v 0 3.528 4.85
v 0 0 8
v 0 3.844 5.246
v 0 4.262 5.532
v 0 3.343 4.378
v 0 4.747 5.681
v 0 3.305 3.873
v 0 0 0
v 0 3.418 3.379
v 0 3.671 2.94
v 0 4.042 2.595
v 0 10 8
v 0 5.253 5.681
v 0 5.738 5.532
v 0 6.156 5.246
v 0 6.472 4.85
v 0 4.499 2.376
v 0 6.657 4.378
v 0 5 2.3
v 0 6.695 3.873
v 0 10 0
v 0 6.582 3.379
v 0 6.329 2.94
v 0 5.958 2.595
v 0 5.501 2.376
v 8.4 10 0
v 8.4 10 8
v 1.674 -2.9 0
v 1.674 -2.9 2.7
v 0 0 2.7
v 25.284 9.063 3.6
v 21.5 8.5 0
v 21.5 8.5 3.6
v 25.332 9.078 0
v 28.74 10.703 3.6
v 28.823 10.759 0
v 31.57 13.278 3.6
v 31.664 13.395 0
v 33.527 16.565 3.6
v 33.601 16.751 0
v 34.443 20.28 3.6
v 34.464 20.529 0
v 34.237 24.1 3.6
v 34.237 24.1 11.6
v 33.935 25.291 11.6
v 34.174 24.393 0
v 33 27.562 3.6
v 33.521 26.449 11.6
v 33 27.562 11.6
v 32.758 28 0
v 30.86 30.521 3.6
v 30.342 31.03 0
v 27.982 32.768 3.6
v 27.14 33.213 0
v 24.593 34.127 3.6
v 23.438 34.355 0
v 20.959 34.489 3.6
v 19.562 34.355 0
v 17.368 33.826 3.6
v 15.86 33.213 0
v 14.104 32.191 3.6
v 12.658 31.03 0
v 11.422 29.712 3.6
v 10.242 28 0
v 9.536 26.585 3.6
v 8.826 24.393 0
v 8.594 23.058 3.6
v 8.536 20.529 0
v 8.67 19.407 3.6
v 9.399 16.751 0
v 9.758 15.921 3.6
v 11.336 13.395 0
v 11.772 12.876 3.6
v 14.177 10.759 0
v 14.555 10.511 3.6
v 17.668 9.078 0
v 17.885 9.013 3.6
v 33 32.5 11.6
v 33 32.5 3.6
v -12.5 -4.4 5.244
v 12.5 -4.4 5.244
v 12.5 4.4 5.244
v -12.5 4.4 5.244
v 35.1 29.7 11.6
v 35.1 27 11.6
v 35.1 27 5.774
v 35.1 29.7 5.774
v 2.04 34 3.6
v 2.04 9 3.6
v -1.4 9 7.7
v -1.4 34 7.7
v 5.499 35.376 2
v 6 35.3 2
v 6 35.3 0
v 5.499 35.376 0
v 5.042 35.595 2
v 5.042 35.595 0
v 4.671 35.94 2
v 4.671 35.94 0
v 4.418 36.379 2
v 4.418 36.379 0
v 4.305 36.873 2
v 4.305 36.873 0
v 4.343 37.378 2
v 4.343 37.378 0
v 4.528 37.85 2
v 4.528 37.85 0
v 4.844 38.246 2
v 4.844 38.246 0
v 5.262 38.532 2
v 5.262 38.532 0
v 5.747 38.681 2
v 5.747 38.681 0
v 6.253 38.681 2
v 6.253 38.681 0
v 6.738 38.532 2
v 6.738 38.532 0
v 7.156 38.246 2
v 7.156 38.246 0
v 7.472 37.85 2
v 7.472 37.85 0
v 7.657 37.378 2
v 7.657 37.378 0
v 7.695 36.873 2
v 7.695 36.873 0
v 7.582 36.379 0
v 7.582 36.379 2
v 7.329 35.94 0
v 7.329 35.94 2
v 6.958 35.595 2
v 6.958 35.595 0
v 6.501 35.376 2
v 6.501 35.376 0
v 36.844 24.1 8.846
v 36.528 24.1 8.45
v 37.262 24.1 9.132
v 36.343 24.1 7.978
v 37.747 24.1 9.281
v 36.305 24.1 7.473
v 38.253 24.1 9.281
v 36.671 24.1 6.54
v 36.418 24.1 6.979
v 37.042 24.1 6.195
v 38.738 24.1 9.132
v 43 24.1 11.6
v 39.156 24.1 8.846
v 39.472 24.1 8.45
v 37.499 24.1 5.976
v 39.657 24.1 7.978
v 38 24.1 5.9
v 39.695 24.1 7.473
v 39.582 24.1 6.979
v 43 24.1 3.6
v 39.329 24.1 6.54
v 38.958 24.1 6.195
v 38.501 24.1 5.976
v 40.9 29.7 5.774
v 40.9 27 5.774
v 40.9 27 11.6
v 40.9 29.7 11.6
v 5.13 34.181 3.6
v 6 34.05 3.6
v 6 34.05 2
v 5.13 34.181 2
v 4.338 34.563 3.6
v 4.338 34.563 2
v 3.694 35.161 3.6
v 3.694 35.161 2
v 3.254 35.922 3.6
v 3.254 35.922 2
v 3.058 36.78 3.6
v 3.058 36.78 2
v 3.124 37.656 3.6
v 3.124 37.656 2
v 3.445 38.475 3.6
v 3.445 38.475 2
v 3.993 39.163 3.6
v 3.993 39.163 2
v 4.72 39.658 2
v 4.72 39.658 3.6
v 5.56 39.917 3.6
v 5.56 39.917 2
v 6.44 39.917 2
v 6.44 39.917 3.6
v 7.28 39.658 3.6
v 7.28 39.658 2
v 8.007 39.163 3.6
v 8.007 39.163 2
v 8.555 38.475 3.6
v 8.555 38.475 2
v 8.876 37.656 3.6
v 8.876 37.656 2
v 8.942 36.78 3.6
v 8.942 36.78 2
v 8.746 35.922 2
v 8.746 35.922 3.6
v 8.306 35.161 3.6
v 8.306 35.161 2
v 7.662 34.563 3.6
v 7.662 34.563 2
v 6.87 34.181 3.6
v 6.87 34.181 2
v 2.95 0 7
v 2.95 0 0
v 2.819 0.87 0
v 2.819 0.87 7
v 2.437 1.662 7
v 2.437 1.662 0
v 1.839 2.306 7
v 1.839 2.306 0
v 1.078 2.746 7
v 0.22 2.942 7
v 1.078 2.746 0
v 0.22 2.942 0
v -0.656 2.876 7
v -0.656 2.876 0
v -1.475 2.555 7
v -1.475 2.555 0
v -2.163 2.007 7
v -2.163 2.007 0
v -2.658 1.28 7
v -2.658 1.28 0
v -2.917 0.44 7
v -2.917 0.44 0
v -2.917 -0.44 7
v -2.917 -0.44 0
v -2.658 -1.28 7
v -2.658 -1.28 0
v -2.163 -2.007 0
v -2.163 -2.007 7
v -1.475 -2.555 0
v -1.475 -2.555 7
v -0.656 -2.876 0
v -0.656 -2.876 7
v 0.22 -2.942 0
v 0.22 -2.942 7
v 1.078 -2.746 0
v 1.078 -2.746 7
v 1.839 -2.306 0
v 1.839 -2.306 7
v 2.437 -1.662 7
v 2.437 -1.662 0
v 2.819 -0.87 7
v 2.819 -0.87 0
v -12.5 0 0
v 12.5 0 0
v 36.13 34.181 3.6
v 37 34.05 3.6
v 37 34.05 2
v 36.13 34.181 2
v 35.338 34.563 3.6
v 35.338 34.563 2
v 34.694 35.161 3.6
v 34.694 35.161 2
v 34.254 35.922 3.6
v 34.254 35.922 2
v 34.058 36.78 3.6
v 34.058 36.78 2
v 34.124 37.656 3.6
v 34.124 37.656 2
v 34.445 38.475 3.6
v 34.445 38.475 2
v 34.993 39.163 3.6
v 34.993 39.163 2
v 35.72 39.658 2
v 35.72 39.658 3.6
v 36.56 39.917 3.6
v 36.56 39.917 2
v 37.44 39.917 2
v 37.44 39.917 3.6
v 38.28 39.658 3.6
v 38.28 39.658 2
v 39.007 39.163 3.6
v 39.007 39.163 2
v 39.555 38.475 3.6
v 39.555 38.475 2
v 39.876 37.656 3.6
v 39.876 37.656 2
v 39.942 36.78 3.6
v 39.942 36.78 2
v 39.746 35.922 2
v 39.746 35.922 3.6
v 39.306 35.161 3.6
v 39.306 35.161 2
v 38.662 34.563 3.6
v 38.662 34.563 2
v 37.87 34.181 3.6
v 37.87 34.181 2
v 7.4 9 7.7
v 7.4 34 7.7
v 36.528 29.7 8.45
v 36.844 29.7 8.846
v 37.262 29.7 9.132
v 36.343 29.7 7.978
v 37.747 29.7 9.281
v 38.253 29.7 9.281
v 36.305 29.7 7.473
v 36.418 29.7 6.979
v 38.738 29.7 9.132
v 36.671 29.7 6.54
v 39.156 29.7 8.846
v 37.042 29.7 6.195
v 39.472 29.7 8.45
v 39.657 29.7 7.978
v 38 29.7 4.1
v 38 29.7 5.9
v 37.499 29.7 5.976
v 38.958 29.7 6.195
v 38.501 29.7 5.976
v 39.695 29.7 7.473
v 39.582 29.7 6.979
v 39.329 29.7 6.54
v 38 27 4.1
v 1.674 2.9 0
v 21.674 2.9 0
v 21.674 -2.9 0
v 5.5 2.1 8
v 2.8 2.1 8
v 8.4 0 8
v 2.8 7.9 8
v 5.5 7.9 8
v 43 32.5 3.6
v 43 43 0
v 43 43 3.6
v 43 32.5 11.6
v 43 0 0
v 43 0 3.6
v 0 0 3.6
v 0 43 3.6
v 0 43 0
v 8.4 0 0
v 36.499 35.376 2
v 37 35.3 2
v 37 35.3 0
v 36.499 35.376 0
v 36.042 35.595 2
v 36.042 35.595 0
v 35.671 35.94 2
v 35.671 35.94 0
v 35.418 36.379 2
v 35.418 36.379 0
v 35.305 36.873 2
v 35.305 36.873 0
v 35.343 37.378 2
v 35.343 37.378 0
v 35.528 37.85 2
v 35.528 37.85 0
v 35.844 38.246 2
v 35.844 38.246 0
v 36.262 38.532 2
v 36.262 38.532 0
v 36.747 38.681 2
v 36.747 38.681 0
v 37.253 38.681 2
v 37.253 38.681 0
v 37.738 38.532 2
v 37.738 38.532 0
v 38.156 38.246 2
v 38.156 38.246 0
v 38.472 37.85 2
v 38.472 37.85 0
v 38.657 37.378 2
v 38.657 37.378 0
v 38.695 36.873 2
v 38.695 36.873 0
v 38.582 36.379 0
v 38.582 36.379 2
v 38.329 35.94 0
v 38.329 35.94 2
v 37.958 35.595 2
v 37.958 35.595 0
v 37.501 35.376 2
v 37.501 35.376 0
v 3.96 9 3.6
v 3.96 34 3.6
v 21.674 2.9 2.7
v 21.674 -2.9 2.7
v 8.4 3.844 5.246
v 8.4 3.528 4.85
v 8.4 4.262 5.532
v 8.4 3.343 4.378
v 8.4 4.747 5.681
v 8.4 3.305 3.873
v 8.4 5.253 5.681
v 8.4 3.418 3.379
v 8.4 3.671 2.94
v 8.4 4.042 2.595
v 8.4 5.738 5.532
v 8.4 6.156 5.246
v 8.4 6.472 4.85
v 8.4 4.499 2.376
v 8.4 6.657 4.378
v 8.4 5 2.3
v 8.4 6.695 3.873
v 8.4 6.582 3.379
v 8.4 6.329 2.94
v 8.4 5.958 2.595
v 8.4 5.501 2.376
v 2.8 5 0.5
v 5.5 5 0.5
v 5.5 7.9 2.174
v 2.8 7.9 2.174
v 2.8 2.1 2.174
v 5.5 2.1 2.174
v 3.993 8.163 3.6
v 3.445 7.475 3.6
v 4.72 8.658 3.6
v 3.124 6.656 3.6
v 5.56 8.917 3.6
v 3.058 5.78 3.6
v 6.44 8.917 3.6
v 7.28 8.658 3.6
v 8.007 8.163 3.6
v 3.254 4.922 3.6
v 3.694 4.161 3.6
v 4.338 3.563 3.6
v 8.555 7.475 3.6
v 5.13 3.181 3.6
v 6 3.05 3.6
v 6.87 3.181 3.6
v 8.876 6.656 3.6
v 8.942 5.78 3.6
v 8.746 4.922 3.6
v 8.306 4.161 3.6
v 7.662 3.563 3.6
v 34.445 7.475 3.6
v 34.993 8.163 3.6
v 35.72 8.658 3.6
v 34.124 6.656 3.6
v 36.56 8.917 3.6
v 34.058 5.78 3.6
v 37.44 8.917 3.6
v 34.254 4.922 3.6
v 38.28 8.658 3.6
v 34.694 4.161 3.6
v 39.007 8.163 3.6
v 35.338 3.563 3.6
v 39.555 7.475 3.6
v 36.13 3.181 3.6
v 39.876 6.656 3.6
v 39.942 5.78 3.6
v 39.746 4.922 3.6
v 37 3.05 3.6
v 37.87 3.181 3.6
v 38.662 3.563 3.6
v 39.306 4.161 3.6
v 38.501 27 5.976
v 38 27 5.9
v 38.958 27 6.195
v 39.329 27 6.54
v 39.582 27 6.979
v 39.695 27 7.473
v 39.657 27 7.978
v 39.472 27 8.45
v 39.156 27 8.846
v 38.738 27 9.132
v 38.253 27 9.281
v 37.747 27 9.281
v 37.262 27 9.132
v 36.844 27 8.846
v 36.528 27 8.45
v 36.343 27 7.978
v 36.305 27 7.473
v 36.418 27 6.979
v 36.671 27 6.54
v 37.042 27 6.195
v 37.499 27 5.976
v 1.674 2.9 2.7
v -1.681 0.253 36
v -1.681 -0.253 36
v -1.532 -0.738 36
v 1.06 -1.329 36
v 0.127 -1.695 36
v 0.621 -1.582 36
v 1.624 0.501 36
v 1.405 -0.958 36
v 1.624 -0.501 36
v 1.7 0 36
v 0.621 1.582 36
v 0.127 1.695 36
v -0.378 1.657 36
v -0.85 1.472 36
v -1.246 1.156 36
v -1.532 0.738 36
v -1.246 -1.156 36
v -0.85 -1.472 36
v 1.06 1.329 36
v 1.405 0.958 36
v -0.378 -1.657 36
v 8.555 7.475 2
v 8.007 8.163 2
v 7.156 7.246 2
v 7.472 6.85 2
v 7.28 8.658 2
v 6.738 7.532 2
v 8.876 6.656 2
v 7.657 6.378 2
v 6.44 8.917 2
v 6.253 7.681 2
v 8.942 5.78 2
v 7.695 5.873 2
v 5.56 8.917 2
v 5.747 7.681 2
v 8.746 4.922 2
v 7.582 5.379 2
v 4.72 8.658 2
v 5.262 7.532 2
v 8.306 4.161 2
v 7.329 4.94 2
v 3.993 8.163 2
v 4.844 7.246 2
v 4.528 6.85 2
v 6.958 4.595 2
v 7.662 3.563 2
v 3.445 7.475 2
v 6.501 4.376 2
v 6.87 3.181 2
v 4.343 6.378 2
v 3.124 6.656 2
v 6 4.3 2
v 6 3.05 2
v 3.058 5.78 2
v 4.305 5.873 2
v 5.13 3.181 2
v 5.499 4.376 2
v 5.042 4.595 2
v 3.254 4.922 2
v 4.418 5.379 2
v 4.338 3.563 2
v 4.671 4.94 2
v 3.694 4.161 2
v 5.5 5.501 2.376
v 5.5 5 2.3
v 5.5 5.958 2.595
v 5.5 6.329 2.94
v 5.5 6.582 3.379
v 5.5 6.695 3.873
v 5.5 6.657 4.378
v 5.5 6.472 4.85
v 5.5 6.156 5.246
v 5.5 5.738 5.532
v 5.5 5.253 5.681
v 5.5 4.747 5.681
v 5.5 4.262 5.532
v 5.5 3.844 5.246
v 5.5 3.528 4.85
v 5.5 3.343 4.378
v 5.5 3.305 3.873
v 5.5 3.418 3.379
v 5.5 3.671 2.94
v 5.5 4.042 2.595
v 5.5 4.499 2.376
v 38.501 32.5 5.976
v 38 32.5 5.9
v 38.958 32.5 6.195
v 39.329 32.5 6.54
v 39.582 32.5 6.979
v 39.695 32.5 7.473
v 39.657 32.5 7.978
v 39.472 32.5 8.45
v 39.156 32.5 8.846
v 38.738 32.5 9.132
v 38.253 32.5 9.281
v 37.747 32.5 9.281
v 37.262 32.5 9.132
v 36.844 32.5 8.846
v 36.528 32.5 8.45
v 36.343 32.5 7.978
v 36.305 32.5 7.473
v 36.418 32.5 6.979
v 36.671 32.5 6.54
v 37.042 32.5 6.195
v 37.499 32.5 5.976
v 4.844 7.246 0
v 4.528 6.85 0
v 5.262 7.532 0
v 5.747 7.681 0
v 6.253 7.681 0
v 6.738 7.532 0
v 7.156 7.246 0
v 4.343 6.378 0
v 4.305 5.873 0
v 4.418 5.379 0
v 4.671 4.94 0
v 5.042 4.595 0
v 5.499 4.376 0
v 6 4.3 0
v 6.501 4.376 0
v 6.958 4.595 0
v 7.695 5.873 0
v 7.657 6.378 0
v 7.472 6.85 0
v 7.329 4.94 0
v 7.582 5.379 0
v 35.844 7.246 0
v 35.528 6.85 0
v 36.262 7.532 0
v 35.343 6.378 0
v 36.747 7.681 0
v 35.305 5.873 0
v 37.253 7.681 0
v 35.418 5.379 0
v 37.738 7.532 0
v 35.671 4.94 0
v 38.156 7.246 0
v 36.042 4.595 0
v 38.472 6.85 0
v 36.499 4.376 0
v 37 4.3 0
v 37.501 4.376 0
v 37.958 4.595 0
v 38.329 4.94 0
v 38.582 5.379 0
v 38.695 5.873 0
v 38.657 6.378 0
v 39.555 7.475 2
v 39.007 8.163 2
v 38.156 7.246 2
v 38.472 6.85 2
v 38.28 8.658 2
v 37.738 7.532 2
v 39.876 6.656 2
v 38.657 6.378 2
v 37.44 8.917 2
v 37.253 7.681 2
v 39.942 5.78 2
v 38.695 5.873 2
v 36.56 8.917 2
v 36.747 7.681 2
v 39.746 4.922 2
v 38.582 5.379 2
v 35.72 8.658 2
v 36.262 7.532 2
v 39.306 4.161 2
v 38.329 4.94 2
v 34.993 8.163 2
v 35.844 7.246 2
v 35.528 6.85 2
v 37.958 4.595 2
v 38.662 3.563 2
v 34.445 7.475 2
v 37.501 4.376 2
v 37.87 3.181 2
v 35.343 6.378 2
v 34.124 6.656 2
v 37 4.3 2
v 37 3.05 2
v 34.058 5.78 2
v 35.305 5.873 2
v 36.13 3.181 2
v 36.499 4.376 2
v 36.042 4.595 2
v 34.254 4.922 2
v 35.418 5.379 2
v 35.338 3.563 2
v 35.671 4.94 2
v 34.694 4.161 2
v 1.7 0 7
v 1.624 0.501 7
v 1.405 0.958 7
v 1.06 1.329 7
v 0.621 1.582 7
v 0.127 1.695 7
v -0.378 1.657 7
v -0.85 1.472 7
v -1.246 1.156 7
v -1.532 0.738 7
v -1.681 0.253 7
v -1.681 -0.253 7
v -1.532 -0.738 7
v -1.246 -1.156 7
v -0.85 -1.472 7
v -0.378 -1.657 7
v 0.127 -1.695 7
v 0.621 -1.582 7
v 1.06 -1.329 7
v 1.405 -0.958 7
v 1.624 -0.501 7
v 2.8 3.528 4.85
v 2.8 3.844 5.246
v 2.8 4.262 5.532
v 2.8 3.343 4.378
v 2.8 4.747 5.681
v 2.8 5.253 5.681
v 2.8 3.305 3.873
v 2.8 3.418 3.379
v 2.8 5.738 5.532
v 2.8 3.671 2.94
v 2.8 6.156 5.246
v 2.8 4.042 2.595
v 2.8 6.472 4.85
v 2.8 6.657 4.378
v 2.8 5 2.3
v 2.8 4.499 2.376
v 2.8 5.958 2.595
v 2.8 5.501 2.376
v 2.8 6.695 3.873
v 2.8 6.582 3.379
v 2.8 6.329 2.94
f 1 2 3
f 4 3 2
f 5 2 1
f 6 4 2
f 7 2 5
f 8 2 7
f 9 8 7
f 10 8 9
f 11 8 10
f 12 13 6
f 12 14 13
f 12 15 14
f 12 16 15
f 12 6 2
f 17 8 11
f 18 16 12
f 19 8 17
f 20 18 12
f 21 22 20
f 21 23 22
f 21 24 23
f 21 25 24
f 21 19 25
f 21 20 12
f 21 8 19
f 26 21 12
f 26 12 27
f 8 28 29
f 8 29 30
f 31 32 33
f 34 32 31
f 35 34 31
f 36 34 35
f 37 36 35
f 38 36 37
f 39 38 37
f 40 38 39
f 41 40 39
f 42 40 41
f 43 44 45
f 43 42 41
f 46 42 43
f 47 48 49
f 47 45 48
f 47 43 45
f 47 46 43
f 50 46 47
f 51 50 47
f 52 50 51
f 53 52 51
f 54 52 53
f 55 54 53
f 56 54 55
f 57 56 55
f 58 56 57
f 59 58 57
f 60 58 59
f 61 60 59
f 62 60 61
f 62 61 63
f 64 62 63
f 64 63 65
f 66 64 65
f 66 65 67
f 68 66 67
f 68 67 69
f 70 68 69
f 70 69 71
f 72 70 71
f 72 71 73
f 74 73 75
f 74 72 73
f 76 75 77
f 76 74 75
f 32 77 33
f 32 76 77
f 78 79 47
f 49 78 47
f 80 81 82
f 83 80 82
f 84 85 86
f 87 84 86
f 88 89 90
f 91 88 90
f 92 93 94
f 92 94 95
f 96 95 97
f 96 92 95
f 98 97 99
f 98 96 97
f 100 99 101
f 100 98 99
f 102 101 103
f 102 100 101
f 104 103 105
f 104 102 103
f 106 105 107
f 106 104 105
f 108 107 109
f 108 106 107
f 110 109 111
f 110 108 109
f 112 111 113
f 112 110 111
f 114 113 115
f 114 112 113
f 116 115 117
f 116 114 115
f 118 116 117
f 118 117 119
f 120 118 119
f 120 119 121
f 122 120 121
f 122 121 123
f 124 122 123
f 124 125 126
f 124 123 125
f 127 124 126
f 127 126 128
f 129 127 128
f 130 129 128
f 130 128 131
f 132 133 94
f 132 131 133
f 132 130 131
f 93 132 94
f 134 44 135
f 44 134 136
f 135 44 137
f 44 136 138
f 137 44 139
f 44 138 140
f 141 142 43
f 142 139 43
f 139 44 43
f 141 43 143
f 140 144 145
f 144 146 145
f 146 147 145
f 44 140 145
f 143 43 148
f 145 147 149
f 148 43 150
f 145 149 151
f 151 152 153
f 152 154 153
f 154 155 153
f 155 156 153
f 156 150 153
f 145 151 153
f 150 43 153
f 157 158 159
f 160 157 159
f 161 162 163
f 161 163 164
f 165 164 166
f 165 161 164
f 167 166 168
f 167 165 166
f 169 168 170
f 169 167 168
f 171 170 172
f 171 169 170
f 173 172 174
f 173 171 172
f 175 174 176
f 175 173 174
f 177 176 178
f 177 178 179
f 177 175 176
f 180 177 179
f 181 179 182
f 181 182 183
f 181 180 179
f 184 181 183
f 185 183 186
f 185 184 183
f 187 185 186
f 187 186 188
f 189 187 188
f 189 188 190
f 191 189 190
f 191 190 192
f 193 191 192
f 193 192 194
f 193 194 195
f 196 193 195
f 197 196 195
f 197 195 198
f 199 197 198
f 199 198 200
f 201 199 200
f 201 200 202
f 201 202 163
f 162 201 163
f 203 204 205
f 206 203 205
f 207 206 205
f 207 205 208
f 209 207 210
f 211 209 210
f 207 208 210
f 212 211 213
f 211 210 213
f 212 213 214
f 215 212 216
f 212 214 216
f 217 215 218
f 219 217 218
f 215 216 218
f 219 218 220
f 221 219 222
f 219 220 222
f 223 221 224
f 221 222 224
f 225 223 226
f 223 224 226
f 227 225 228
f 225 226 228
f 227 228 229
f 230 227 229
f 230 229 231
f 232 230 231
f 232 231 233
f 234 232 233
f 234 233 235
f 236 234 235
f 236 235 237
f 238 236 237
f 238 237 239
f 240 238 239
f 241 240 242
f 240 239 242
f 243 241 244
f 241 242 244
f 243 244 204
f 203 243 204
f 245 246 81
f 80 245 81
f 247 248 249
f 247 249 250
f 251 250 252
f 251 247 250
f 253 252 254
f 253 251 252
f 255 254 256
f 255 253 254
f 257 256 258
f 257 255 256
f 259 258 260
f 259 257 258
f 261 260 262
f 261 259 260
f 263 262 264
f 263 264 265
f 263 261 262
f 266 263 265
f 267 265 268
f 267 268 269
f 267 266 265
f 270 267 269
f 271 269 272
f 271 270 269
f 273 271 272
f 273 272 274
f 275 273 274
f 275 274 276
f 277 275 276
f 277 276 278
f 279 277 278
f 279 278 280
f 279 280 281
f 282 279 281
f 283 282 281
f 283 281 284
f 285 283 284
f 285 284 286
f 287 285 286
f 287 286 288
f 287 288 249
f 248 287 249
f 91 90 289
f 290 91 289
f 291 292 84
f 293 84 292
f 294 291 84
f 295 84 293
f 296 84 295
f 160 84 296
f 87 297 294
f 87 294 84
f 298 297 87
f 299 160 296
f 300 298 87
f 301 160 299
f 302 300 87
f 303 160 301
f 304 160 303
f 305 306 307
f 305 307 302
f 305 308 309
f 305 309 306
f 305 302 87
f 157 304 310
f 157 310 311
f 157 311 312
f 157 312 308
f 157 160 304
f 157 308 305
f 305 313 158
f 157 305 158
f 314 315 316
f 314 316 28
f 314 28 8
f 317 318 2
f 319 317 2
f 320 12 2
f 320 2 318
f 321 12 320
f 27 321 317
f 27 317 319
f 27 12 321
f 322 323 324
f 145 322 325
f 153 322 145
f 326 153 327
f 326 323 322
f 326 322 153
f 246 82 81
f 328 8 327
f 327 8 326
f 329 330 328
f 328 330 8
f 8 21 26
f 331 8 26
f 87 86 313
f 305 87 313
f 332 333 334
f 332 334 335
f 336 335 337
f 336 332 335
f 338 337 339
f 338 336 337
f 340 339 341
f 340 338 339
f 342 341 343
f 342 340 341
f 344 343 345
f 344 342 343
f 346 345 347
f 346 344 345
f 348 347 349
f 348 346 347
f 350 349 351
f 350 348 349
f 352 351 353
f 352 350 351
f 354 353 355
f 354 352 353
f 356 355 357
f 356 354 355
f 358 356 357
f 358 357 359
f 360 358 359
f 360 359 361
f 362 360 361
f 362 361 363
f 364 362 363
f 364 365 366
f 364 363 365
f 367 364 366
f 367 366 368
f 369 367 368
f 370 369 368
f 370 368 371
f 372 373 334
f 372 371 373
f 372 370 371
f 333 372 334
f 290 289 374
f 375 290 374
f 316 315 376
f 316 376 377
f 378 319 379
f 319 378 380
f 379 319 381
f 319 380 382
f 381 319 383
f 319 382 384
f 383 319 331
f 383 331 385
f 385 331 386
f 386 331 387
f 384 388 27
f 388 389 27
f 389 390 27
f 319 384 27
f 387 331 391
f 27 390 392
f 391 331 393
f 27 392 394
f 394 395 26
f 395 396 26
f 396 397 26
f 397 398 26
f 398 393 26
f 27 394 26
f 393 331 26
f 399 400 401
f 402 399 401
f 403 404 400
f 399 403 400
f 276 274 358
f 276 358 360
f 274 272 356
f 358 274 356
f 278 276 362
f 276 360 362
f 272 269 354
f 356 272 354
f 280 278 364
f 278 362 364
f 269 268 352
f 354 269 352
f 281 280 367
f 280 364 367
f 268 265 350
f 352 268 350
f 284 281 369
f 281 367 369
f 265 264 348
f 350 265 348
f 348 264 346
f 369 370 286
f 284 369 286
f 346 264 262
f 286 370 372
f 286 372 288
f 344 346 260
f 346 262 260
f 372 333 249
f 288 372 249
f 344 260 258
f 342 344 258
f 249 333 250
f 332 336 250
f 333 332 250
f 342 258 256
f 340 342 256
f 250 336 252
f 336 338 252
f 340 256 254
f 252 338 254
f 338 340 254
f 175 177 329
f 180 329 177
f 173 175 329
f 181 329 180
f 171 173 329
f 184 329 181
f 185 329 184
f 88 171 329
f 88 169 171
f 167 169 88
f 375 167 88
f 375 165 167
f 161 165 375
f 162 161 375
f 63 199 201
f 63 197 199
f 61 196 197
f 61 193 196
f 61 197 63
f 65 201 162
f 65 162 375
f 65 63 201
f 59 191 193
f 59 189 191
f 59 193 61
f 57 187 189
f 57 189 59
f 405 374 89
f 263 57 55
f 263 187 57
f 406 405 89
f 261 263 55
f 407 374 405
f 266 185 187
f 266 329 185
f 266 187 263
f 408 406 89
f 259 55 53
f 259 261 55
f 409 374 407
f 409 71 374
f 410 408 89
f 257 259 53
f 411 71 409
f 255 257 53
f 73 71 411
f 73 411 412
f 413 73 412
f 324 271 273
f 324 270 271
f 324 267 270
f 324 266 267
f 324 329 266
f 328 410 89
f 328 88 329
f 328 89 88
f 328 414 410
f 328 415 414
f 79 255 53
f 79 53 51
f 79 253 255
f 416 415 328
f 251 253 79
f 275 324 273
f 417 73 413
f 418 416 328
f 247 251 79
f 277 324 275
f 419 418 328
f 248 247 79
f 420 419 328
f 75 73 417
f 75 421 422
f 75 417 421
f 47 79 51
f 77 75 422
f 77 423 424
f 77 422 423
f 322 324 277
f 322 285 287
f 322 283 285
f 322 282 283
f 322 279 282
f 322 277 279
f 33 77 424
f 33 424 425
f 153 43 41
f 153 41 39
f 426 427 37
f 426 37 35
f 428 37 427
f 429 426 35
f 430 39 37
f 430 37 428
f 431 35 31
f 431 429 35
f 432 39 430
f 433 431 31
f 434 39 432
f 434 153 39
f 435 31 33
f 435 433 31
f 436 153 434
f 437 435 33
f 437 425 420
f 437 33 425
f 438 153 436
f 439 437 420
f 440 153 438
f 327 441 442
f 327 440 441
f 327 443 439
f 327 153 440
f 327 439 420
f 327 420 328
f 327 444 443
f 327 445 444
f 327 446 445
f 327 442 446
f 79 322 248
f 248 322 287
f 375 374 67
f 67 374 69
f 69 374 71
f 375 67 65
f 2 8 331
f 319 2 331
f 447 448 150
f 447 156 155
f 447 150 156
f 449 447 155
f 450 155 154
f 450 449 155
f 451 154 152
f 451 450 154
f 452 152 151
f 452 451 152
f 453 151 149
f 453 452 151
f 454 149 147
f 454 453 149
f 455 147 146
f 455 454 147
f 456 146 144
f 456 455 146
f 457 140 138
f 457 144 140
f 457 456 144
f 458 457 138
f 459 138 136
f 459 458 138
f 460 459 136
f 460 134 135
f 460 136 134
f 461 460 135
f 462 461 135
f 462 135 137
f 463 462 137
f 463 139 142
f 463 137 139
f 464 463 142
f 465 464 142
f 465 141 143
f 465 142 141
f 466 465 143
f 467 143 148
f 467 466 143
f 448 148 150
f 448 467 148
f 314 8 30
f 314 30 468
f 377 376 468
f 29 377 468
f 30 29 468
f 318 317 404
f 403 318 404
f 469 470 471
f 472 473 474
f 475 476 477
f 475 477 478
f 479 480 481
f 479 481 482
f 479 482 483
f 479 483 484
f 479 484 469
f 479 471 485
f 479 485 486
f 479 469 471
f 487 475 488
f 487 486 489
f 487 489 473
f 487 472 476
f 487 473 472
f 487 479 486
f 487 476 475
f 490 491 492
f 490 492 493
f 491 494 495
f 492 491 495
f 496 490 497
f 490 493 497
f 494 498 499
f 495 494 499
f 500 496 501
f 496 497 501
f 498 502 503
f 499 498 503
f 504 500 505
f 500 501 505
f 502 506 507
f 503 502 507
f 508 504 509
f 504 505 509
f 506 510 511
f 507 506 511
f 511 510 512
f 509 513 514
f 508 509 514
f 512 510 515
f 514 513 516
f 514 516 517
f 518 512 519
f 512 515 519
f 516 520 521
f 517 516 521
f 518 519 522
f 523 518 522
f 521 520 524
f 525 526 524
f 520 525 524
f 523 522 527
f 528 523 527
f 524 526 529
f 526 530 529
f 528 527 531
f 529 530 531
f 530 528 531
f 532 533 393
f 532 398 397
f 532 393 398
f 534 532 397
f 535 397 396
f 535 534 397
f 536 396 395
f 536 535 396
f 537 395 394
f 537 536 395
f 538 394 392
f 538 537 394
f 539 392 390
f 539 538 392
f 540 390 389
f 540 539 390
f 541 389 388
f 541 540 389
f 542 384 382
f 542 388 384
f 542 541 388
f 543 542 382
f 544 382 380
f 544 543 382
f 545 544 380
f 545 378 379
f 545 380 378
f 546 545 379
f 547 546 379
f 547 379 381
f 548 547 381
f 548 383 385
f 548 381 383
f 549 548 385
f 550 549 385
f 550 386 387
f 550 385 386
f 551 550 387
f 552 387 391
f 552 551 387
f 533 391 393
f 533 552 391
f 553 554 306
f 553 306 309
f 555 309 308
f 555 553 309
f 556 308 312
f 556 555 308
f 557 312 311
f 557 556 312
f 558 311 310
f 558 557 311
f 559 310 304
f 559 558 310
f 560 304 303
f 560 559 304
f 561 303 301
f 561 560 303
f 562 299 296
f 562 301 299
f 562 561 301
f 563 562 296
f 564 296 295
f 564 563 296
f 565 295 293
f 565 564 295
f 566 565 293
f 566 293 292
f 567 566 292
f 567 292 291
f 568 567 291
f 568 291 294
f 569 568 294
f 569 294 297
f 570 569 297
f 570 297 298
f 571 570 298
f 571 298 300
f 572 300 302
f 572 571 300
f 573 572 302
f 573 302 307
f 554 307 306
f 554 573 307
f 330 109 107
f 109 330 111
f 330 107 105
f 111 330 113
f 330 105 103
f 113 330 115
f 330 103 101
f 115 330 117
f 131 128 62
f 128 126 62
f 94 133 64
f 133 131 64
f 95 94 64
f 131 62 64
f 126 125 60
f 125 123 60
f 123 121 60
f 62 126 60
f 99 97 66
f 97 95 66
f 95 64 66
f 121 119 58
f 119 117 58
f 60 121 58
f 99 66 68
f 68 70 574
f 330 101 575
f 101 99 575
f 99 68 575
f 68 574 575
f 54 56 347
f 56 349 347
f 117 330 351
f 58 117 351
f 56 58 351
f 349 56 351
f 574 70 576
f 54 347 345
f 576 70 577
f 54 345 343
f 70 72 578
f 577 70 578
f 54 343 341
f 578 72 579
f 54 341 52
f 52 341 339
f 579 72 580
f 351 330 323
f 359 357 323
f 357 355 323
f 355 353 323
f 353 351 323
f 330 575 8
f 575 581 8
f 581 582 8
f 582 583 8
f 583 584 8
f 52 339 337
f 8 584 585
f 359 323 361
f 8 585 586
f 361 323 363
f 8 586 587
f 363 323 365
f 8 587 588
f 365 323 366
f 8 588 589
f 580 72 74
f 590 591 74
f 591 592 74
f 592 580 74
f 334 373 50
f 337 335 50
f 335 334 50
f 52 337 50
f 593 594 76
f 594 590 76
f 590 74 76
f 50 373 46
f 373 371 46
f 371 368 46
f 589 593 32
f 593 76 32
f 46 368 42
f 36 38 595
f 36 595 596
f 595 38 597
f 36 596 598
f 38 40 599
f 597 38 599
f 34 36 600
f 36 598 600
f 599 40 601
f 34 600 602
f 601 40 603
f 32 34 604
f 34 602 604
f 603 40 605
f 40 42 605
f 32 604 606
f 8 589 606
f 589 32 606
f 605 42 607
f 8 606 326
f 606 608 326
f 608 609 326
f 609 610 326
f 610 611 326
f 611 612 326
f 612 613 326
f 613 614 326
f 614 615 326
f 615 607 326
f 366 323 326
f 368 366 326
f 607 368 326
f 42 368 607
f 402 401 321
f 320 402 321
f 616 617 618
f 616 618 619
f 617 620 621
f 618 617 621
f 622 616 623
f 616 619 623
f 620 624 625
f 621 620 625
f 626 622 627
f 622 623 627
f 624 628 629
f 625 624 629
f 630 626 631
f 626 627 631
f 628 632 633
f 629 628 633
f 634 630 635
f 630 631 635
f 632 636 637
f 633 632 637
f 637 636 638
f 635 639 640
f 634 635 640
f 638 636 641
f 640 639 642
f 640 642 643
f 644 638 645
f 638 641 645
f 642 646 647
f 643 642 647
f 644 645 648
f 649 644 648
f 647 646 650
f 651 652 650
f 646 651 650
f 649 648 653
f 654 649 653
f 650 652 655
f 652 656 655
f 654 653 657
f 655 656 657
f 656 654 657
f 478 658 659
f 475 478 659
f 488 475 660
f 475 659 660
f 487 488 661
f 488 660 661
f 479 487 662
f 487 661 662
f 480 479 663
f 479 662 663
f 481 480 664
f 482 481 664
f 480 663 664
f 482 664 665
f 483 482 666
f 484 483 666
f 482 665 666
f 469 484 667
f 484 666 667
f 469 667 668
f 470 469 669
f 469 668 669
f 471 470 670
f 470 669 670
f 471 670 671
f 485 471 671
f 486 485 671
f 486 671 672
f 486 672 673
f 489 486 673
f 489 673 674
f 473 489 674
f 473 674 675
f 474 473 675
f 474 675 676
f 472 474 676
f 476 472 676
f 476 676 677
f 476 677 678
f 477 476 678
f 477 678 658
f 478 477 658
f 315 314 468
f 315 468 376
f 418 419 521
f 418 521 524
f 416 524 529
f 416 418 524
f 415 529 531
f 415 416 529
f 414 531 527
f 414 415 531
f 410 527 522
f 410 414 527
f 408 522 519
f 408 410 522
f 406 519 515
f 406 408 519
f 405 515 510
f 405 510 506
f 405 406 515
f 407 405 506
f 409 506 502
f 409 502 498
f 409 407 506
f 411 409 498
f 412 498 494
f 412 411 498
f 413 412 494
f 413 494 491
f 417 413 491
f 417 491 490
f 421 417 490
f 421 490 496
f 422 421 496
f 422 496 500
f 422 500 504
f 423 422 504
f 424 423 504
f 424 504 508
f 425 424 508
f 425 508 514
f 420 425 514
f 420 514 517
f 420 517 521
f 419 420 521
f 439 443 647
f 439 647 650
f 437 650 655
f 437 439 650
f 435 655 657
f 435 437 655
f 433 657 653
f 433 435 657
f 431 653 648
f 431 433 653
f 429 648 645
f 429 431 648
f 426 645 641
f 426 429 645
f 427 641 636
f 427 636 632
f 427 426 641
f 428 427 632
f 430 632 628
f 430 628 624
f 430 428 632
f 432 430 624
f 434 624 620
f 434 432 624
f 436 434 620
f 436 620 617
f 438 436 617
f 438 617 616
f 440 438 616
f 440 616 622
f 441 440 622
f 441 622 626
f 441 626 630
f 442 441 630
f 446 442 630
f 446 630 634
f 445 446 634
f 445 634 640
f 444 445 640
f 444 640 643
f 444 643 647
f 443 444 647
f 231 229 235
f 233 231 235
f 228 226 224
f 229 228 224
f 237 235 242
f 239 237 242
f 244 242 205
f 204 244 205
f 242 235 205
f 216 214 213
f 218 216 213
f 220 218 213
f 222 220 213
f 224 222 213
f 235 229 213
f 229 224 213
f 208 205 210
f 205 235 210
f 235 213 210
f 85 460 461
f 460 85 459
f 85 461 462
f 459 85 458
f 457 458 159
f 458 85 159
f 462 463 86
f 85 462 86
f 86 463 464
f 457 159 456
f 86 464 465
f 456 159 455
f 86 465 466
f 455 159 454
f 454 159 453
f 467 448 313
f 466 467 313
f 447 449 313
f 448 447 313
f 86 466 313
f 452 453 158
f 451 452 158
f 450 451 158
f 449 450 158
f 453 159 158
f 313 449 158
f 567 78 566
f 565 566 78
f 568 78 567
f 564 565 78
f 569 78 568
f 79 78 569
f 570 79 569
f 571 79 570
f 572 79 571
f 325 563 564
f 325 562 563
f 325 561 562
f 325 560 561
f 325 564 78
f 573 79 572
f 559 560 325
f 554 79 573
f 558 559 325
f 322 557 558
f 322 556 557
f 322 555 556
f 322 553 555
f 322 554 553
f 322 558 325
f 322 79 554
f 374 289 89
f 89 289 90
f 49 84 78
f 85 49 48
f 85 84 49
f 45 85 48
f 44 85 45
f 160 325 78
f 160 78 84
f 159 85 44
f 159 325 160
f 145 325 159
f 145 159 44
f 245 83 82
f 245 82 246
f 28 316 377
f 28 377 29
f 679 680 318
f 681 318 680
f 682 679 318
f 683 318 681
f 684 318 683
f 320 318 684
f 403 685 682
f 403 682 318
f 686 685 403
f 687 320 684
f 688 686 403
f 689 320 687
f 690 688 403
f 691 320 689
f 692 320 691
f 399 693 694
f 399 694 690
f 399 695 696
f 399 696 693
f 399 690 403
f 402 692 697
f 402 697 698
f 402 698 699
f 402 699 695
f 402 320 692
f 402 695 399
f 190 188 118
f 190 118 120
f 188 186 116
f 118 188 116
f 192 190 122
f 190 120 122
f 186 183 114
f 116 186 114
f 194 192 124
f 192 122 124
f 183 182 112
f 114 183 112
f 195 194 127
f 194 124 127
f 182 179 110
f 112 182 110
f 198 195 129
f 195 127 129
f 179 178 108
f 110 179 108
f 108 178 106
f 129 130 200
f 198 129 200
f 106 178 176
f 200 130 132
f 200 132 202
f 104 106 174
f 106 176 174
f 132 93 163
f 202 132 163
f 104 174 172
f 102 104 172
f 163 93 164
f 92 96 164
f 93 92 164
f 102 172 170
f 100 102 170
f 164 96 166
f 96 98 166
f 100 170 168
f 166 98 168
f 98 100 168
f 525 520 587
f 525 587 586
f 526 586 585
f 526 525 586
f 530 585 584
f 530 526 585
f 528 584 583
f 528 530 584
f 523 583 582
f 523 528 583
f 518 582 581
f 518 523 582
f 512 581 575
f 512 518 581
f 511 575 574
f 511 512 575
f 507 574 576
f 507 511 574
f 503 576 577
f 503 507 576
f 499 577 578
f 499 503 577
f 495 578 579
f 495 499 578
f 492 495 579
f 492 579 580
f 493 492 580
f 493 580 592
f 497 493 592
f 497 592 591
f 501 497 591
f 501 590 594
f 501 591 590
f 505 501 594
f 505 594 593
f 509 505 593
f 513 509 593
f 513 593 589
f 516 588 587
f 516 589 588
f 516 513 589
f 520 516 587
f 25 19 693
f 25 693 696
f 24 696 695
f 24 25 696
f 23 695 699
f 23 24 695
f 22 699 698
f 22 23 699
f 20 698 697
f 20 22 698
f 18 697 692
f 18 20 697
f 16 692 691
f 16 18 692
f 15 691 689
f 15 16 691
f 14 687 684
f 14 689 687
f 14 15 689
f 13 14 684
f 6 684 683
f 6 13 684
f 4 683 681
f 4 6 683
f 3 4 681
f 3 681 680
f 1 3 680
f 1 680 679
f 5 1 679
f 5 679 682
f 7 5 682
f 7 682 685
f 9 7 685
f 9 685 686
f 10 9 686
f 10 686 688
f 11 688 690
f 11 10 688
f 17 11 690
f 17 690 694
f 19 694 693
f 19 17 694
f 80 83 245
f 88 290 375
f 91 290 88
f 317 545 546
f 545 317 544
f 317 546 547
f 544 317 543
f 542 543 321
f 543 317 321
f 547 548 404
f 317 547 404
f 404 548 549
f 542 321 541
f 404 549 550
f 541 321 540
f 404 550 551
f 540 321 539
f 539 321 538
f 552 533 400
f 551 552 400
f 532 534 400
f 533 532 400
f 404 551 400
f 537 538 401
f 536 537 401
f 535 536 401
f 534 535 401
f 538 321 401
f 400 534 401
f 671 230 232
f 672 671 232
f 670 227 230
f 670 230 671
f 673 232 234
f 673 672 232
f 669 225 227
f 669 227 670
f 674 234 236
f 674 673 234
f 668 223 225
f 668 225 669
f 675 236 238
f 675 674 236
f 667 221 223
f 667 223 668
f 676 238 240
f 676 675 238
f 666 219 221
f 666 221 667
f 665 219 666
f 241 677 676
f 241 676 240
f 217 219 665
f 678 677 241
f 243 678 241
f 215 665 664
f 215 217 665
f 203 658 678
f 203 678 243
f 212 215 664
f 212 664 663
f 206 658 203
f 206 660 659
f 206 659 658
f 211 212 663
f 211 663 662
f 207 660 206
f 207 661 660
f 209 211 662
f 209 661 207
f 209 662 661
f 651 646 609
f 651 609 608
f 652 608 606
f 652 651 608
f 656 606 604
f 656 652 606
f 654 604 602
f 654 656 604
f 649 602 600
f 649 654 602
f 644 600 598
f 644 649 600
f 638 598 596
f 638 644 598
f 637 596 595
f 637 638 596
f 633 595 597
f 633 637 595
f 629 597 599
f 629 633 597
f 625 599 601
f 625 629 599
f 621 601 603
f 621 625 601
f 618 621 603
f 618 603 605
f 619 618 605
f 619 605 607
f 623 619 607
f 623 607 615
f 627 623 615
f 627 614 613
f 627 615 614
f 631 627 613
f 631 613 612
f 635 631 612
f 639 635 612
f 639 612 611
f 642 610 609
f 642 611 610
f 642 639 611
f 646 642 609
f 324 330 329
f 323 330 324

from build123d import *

# Parameters (mm, degrees)
CYLINDER_R                   = 2.95
CYLINDER_DEPTH               = 7
CYLINDER001_R                = 1.7
CYLINDER001_DEPTH            = 30
PAD002_DEPTH                 = 2.7
PAD039_DEPTH                 = 12.5
CLONE292_PITCH_ANGLE         = -90
CLONE291_PITCH_ANGLE         = 90
BOX255_W                     = 8.4
BOX255_H                     = 10
BOX255_DEPTH                 = 8
CLONE287_ROLL_ANGLE          = 180
CLONE287_PLACEMENT_ANGLE     = -90
CLONE289_ROLL_ANGLE          = 180
CLONE289_PLACEMENT_ANGLE     = -90
CLONE286_ROLL_ANGLE          = 180
CLONE286_PLACEMENT_ANGLE     = -90
CLONE288_ROLL_ANGLE          = 180
CLONE288_PLACEMENT_ANGLE     = -90
CYLINDER1027_R               = 13
CYLINDER1027_DEPTH           = 15
CYLINDER1027_PLACEMENT_ANGLE = -90
CLONE290_PLACEMENT_ANGLE     = -90
CLONE293_PLACEMENT_ANGLE     = -90
BOX254_W                     = 43
BOX254_H                     = 43
BOX254_DEPTH                 = 3.6
BOX254_PLACEMENT_ANGLE       = -90


with BuildPart() as m3bolthead:
    # Cylinder → Cylinder (new body)
    with BuildSketch(Plane.XY):
        Circle(CYLINDER_R)
    extrude(amount=CYLINDER_DEPTH)


with BuildPart() as m3bolt:
    # Cylinder001 → Cylinder001 (new body)
    with BuildSketch(Plane.XY.offset(6)):
        Circle(CYLINDER001_R)
    extrude(amount=CYLINDER001_DEPTH)

    # Fusion: union M3BoltHead
    add(m3bolthead.part)


with BuildPart() as m3nuthousing:
    # Sketch003 → Pad002 (new body)
    with BuildSketch(Plane.XY):
        Polygon((0, 0), (1.674316, 2.9), (21.674316, 2.9), (21.674316, -2.9), (1.674316, -2.9), align=None)
    extrude(amount=PAD002_DEPTH)


with BuildPart() as art56milanoguidemaster:
    # Sketch056 → Pad039 (new body, symmetric)
    with BuildSketch(Plane.YZ):
        Polygon((-4.4, 5.243716), (4.4, 5.243716), (0, 0), align=None)
    extrude(amount=PAD039_DEPTH, both=True)


with BuildPart() as clone_of_m3nuthousing026:
    # Clone292 base: copy of M3NutHousing
    add(m3nuthousing.part)


with BuildPart() as clone_of_m3nuthousing026_1:
    # Clone292 pitch: moved
    add(clone_of_m3nuthousing026.part.rotate(Axis((0, 0, 0), (0, 1, 0)), CLONE292_PITCH_ANGLE))


with BuildPart() as clone_of_m3nuthousing026_2:
    # Clone292 placement: moved
    add(clone_of_m3nuthousing026_1.part.moved(Location((5.5, 5, 0.5))))


with BuildPart() as fusion101:
    # Clone291 base: copy of M3Bolt
    add(m3bolt.part)


with BuildPart() as fusion101_1:
    # Clone291 pitch: moved
    add(fusion101.part.rotate(Axis((0, 0, 0), (0, 1, 0)), CLONE291_PITCH_ANGLE))


with BuildPart() as fusion101_2:
    # Clone291 placement: moved
    add(fusion101_1.part.moved(Location((-14.5, 5, 4))))

    # Fusion101: union Clone of M3NutHousing026
    add(clone_of_m3nuthousing026_2.part)


with BuildPart() as art56nutholdermaster:
    # Box255 → Box255 (new body)
    with BuildSketch(Plane.XY):
        with Locations((4.2, 5)):
            Rectangle(BOX255_W, BOX255_H)
    extrude(amount=BOX255_DEPTH)

    # Cut087: cut Fusion101
    add(fusion101_2.part, mode=Mode.SUBTRACT)


with BuildPart() as clone_of_m3bolt100:
    # Clone287 base: copy of M3Bolt
    add(m3bolt.part)


with BuildPart() as clone_of_m3bolt100_1:
    # Clone287 roll: moved
    add(clone_of_m3bolt100.part.rotate(Axis((0, 0, 0), (1, 0, 0)), CLONE287_ROLL_ANGLE))


with BuildPart() as clone_of_m3bolt100_2:
    # Clone287 placement: moved
    add(clone_of_m3bolt100_1.part.moved(Location((6, 37, 9))).rotate(Axis((6, 37, 9), (0, 0, 1)), CLONE287_PLACEMENT_ANGLE))


with BuildPart() as clone_of_m3bolt102:
    # Clone289 base: copy of M3Bolt
    add(m3bolt.part)


with BuildPart() as clone_of_m3bolt102_1:
    # Clone289 roll: moved
    add(clone_of_m3bolt102.part.rotate(Axis((0, 0, 0), (1, 0, 0)), CLONE289_ROLL_ANGLE))


with BuildPart() as clone_of_m3bolt102_2:
    # Clone289 placement: moved
    add(clone_of_m3bolt102_1.part.moved(Location((37, 6, 9))).rotate(Axis((37, 6, 9), (0, 0, 1)), CLONE289_PLACEMENT_ANGLE))


with BuildPart() as clone_of_m3bolt099:
    # Clone286 base: copy of M3Bolt
    add(m3bolt.part)


with BuildPart() as clone_of_m3bolt099_1:
    # Clone286 roll: moved
    add(clone_of_m3bolt099.part.rotate(Axis((0, 0, 0), (1, 0, 0)), CLONE286_ROLL_ANGLE))


with BuildPart() as clone_of_m3bolt099_2:
    # Clone286 placement: moved
    add(clone_of_m3bolt099_1.part.moved(Location((6, 6, 9))).rotate(Axis((6, 6, 9), (0, 0, 1)), CLONE286_PLACEMENT_ANGLE))


with BuildPart() as clone_of_m3bolt101:
    # Clone288 base: copy of M3Bolt
    add(m3bolt.part)


with BuildPart() as clone_of_m3bolt101_1:
    # Clone288 roll: moved
    add(clone_of_m3bolt101.part.rotate(Axis((0, 0, 0), (1, 0, 0)), CLONE288_ROLL_ANGLE))


with BuildPart() as clone_of_m3bolt101_2:
    # Clone288 placement: moved
    add(clone_of_m3bolt101_1.part.moved(Location((37, 37, 9))).rotate(Axis((37, 37, 9), (0, 0, 1)), CLONE288_PLACEMENT_ANGLE))


with BuildPart() as fusion106:
    # Cylinder1027 → Cylinder1027 (new body)
    with BuildSketch(Plane.XY):
        Circle(CYLINDER1027_R)
    extrude(amount=CYLINDER1027_DEPTH)


with BuildPart() as fusion106_1:
    # Cylinder1027 placement: moved
    add(fusion106.part.moved(Location((21.5, 21.5, 0))).rotate(Axis((21.5, 21.5, 0), (0, 0, 1)), CYLINDER1027_PLACEMENT_ANGLE))

    # Fusion106: union Clone of M3Bolt100, Clone of M3Bolt102, Clone of M3Bolt099, Clone of M3Bolt101
    add(clone_of_m3bolt100_2.part)
    add(clone_of_m3bolt102_2.part)
    add(clone_of_m3bolt099_2.part)
    add(clone_of_m3bolt101_2.part)


with BuildPart() as clone_of_art56milanoguidemaster:
    # Clone290 base: copy of Art56MilanoGuideMaster
    add(art56milanoguidemaster.part)


with BuildPart() as clone_of_art56milanoguidemaster_1:
    # Clone290 placement: moved
    add(clone_of_art56milanoguidemaster.part.moved(Location((3, 21.5, 2.456284))).rotate(Axis((3, 21.5, 2.456284), (0, 0, 1)), CLONE290_PLACEMENT_ANGLE))


with BuildPart() as clone_of_art56nutholdermaster:
    # Clone293 base: copy of Art56NutHolderMaster
    add(art56nutholdermaster.part)


with BuildPart() as clone_of_art56nutholdermaster_1:
    # Clone293 placement: moved
    add(clone_of_art56nutholdermaster.part.moved(Location((33, 32.5, 3.6))).rotate(Axis((33, 32.5, 3.6), (0, 0, 1)), CLONE293_PLACEMENT_ANGLE))


with BuildPart() as art56motorholdera:
    # Box254 → Box254 (new body)
    with BuildSketch(Plane.XY):
        with Locations((21.5, 21.5)):
            Rectangle(BOX254_W, BOX254_H)
    extrude(amount=BOX254_DEPTH)


with BuildPart() as art56motorholdera_1:
    # Box254 placement: moved
    add(art56motorholdera.part.moved(Location((0, 43, 0))).rotate(Axis((0, 43, 0), (0, 0, 1)), BOX254_PLACEMENT_ANGLE))

    # Fusion105: union Clone of Art56MilanoGuideMaster, Clone of Art56NutHolderMaster
    add(clone_of_art56milanoguidemaster_1.part)
    add(clone_of_art56nutholdermaster_1.part)

    # Cut089: cut Fusion106
    add(fusion106_1.part, mode=Mode.SUBTRACT)


solid = Compound([m3bolt.part, m3nuthousing.part, art56milanoguidemaster.part, art56nutholdermaster.part, art56motorholdera_1.part])
